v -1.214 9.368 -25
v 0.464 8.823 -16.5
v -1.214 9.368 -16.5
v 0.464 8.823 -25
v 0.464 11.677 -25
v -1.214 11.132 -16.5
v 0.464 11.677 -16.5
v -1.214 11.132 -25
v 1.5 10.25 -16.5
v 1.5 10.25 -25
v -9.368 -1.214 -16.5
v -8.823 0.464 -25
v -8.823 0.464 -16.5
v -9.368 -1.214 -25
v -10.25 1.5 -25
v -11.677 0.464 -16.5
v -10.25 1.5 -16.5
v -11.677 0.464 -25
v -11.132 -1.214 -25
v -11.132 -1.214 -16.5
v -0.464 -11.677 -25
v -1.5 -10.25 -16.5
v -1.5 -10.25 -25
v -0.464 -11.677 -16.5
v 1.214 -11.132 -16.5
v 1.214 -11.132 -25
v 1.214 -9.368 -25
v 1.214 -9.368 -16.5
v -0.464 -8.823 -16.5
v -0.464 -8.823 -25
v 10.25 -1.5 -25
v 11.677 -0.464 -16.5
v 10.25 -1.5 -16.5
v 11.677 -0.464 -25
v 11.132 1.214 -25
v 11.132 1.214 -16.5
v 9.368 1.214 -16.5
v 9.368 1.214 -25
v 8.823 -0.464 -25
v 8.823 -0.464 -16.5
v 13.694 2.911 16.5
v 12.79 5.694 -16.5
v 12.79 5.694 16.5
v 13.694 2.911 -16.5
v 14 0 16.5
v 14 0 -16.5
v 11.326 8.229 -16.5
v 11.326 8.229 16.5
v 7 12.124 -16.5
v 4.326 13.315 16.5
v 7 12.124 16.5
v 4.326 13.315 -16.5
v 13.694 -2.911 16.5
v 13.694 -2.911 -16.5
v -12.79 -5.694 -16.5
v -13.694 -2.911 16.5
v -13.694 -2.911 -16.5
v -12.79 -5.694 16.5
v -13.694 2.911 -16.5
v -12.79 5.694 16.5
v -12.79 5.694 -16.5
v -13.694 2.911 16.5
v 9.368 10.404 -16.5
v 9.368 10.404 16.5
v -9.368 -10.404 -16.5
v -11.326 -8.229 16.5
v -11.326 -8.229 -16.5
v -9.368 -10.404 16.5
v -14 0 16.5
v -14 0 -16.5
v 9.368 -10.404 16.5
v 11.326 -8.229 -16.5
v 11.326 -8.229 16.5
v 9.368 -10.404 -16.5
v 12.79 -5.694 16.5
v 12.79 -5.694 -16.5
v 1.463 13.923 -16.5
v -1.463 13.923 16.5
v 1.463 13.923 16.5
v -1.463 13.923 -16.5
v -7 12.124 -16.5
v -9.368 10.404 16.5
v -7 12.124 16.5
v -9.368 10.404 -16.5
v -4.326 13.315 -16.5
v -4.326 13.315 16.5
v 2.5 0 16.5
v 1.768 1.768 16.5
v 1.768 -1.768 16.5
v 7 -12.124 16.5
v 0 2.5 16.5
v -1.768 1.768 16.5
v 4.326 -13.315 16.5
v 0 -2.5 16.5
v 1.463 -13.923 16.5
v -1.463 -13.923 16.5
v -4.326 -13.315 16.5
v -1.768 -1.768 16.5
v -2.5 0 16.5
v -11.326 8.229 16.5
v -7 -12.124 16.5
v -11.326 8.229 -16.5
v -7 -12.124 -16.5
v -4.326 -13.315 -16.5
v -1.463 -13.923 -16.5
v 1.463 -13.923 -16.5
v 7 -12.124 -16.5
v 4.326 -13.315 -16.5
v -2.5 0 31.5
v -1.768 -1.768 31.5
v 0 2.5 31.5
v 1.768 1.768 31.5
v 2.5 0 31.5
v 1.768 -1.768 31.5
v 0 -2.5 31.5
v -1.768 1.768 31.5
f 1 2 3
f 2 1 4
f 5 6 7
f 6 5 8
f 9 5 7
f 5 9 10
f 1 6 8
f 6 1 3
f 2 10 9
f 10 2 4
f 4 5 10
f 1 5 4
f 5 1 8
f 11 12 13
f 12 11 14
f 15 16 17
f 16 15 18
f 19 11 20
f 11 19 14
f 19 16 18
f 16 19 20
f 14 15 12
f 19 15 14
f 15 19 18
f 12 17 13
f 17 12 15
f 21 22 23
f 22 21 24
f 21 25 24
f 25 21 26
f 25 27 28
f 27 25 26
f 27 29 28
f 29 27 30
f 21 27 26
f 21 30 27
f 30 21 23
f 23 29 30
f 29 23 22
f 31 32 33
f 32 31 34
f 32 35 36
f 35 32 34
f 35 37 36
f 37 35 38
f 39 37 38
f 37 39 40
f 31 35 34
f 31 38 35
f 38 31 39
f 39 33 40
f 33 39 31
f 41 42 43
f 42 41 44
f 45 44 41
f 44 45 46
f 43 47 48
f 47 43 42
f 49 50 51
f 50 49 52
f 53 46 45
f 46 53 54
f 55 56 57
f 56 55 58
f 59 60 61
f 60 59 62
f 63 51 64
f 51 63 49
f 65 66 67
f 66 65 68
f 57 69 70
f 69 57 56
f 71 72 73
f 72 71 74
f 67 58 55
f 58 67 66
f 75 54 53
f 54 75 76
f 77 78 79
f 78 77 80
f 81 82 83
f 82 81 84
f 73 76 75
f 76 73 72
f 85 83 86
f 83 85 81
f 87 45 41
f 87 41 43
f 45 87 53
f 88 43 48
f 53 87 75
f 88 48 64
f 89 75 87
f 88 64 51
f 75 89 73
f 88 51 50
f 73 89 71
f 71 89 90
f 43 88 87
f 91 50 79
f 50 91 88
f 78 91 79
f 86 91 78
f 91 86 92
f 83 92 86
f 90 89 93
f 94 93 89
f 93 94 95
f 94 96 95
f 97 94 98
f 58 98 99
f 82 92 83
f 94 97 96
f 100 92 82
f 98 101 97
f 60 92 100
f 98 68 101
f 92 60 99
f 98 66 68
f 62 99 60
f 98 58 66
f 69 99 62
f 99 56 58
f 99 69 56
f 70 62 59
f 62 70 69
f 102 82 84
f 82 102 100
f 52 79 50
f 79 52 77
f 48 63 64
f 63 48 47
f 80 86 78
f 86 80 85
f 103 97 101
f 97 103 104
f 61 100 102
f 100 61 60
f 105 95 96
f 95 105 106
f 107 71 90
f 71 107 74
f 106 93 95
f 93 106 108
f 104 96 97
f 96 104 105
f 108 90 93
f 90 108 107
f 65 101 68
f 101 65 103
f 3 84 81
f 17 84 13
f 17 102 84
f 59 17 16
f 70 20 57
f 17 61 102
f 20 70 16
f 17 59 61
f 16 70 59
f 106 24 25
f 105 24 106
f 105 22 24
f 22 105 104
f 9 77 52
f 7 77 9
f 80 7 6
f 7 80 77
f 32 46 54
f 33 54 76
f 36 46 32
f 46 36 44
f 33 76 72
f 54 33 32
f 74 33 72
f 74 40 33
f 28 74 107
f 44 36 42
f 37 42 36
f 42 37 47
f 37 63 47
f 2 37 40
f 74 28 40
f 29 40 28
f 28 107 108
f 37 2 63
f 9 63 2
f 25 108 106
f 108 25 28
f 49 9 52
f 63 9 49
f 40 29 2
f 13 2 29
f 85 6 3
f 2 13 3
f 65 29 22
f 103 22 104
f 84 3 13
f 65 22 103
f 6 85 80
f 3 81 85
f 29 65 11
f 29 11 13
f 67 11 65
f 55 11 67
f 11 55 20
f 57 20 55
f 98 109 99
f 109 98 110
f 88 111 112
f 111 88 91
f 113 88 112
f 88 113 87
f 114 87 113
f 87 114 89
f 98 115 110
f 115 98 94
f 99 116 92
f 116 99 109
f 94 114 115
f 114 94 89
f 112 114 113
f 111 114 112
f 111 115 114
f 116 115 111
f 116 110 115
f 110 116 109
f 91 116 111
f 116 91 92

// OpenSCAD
/*
	AX-2213 Motor, written in OpenScad by Skippy - http://philipmcgaw.com
	
	The AX-2213 is an out runner

	This work is licensed under the Creative Commons Attribution-NonCommercial-ShareAlike 4.0 International License. To view a copy of this license, visit http://creativecommons.org/licenses/by-nc-sa/4.0/.

*/

// Things to Use

// Variables

module AX2213() 
{
	cylinder(d = 28, h = 33, center = true);
	translate([0,0,24])
	cylinder(d = 5, h = 15, center = true);

	// Mounting Holes.
	translate([0, 0, -20])
	for (i = [0 : 3])
	{
		rotate(i * 360 / 4)
		translate([0, 23.5/2 - 1.5, 0])
		#cylinder(h = 10, d = 3, center=true);
	}
	
	
}

AX2213();
